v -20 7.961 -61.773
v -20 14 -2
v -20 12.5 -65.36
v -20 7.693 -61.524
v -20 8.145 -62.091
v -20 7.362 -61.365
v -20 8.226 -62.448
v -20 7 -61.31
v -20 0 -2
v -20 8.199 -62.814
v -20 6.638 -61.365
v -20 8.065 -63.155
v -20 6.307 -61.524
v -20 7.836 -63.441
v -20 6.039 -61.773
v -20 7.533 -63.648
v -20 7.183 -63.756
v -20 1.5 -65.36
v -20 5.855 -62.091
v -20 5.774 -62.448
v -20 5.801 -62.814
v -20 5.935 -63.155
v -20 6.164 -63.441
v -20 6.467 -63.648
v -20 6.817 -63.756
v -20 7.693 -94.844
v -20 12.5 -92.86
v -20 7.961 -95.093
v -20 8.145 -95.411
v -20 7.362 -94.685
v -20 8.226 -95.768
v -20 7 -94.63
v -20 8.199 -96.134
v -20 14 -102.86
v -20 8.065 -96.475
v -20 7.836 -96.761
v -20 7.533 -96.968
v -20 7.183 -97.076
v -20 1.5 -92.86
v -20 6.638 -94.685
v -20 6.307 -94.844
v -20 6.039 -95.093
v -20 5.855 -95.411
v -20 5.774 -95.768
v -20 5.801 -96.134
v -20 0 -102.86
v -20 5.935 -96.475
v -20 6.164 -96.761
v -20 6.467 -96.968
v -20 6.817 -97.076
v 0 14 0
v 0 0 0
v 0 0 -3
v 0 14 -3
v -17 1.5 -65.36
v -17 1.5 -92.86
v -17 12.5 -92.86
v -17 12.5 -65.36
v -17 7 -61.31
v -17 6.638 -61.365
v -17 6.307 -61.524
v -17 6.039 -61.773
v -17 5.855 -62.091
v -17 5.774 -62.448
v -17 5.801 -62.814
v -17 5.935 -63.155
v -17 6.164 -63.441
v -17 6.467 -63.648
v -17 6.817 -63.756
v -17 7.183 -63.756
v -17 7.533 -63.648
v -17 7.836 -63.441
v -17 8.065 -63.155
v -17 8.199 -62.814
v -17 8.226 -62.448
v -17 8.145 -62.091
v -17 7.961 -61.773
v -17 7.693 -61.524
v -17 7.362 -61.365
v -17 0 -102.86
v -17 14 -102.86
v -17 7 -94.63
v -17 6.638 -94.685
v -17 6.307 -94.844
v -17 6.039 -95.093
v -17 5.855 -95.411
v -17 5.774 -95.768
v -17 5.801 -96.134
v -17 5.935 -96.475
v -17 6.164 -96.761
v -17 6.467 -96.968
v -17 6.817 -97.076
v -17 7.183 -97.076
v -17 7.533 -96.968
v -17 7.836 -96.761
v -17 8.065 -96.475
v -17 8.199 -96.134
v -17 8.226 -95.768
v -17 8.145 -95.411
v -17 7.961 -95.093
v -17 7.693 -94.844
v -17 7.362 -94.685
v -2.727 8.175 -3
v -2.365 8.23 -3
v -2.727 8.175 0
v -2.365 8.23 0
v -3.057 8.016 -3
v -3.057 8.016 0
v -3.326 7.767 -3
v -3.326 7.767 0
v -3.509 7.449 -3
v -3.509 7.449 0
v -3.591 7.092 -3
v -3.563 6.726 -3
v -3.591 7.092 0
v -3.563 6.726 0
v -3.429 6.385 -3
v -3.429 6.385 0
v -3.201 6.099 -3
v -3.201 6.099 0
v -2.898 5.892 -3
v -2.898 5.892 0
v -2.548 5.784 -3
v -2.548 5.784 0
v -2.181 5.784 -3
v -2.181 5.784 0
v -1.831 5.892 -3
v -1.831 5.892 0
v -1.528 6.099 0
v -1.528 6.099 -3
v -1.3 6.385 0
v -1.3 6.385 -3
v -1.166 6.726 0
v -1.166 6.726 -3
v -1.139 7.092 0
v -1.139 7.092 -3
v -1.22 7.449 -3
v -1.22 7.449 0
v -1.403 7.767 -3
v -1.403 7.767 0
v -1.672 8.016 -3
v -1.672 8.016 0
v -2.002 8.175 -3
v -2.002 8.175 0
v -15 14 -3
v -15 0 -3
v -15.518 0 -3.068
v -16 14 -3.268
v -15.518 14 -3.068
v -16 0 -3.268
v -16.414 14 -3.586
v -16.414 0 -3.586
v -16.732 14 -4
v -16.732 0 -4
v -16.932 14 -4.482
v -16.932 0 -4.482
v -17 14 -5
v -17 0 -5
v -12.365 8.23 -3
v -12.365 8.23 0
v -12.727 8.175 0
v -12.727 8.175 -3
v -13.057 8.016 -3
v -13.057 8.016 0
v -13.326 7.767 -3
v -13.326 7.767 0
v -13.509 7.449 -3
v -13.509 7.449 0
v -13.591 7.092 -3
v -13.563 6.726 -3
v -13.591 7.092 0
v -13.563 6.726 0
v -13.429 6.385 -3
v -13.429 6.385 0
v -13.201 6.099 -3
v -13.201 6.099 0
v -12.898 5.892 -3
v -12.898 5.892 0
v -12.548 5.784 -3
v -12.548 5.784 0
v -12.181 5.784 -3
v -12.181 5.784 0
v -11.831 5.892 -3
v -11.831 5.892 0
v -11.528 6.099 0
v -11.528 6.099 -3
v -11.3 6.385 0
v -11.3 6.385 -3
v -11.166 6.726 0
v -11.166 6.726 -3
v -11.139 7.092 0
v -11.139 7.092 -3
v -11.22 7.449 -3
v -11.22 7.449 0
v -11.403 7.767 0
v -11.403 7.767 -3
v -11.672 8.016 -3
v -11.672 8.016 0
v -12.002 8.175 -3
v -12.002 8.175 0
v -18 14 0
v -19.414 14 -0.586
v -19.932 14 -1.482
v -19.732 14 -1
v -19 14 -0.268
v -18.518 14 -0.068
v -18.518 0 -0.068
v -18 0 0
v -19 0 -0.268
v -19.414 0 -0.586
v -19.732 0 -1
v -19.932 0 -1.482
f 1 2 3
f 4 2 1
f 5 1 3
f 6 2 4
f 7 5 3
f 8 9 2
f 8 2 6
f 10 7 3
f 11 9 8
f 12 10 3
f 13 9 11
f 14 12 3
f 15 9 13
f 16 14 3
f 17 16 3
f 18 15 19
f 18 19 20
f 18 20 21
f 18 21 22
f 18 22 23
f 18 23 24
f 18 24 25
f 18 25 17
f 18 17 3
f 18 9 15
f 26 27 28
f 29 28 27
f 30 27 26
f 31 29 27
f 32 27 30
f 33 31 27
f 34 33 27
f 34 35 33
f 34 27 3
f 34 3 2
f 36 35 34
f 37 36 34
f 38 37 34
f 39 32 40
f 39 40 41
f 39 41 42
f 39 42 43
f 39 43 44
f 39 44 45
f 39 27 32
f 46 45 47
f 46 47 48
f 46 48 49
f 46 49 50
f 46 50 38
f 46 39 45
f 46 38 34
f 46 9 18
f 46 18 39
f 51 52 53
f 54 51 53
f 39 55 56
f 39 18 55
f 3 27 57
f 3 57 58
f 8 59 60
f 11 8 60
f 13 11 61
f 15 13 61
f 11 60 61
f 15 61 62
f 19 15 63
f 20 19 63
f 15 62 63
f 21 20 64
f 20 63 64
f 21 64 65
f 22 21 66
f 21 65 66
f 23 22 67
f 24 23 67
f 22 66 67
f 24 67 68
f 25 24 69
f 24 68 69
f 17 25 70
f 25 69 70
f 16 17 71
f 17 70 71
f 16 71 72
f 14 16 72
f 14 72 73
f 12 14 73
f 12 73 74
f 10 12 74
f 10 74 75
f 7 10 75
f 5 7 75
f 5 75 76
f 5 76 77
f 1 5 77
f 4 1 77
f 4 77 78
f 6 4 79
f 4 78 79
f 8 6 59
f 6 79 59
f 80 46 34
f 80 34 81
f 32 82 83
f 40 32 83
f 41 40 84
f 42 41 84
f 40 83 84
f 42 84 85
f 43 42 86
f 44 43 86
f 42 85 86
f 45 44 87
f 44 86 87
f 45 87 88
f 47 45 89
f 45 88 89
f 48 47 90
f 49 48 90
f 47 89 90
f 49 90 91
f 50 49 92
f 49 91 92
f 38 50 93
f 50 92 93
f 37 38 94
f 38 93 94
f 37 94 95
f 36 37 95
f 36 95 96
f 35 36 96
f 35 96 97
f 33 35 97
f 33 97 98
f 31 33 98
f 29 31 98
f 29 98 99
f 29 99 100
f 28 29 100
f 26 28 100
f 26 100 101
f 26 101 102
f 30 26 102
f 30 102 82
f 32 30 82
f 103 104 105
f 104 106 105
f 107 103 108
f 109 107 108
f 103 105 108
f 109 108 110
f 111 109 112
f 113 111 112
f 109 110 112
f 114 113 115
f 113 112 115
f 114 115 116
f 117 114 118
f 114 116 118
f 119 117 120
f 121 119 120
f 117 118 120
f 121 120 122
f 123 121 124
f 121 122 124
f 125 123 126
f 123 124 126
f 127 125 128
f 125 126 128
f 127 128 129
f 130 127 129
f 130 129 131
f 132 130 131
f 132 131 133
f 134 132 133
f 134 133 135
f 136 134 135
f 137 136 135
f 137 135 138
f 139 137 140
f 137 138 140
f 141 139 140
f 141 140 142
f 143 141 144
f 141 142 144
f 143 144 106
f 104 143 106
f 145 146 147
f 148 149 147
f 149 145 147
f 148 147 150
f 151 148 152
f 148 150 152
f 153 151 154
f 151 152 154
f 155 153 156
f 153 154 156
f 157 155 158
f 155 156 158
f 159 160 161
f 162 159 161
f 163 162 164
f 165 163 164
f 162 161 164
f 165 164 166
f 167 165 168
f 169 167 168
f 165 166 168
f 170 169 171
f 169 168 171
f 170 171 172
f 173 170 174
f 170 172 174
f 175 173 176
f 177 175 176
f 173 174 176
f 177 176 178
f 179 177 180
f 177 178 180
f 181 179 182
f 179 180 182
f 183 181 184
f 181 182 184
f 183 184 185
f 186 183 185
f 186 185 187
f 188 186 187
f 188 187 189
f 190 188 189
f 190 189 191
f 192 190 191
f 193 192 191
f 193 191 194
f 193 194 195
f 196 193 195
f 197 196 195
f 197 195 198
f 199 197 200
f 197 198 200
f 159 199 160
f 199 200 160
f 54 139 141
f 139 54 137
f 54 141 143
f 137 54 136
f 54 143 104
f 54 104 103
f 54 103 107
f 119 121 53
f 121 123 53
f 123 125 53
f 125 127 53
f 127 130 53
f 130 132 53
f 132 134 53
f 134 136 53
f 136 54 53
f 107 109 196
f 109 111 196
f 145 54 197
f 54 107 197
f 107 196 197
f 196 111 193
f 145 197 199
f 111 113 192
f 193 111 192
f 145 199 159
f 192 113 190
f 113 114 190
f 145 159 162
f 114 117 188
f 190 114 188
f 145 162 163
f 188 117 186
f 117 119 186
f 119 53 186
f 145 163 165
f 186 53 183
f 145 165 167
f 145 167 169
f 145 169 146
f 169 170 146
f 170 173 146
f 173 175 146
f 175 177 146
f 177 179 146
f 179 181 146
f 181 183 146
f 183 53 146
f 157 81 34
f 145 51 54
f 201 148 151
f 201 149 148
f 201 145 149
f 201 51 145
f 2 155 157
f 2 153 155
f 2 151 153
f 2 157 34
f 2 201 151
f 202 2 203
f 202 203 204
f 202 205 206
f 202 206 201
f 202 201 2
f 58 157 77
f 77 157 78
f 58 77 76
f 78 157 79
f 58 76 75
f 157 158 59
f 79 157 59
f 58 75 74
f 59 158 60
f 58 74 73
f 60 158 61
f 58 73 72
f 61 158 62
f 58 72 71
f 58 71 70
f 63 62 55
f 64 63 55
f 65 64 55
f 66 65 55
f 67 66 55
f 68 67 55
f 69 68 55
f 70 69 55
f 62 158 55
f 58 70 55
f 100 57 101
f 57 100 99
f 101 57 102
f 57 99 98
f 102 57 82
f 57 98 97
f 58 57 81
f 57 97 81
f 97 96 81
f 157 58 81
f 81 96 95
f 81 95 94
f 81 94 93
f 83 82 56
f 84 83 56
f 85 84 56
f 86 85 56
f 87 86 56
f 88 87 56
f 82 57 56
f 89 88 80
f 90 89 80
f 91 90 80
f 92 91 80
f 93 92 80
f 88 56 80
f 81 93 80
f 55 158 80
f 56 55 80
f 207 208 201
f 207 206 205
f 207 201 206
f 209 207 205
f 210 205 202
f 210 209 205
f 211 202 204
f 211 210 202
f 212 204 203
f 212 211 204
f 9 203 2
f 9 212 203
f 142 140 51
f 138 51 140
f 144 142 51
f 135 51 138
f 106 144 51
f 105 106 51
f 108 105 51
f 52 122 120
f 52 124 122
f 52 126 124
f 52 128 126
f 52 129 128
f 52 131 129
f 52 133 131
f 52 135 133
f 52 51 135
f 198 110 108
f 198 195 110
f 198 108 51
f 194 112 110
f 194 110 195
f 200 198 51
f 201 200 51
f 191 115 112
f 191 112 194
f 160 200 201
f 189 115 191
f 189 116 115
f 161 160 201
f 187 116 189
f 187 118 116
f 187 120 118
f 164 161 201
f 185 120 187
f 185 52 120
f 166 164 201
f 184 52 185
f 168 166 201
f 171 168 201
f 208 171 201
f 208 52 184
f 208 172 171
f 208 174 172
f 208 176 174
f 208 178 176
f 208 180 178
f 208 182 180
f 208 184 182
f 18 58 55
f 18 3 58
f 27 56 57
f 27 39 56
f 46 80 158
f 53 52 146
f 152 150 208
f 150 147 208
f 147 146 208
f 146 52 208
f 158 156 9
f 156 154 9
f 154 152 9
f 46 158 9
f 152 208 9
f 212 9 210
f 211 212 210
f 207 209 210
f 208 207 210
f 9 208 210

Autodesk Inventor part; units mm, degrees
ref_plane "YZ Plane" through (0, 0, 0) normal (1, 0, 0) x (0, 1, 0)
ref_plane "XZ Plane" through (0, 0, 0) normal (0, 1, 0) x (-1, 0, 0)
ref_plane "XY Plane" through (0, 0, 0) normal (0, 0, 1) x (1, 0, 0)
sketch "Sketch1" plane through (0, 0, 0) normal (0, 1, 0) x (-1, 0, 0)
  line L0 (0, 0) -> (0, -3)
  line L1 (0, -3) -> (15, -3)
  line L2 (17, -5) -> (17, -102.86)
  line L3 (0, 0) -> (18, 0)
  line L4 (20, -2) -> (20, -102.86)
  line L5 (20, -102.86) -> (17, -102.86)
  arc A0 (17, -5) -> (15, -3) centre (15, -5) ccw
  arc A1 (20, -2) -> (18, 0) centre (18, -2) ccw
  point P0 (17, -3)
  point P1 (20, 0)
  dimension "d0" = 3
  dimension "d1" = 17
  dimension "d2" = 99.86
  dimension "d3" = 20
  dimension "d4" = 2
extrude "Extrusion1" add sketch "Sketch1" along normal blind 14
sketch "Sketch2" plane through (0, 0, -3) normal (0, 0, -1) x (-1, 0, 0)
  point P0 (0, 0)
sketch "Sketch3" plane through (0, 0, -3) normal (0, 0, -1) x (-1, 0, 0)
  circle A0 centre (2.3646, 7) radius 1.5
  circle A1 centre (12.3646, 7) radius 1.5
  line L0 (0, 14) -> (15, 14) projected
  line L1 (0, 0) -> (15, 0) projected
  dimension "d7" = 3
  dimension "d8" = 3
  dimension "d9" = 14
  dimension "d10" = 7
  dimension "d11" = 10
hole "Hole1" at (-2.3646, 7, -3) at (-12.3646, 7, -3) direction (0, 0, 1) diameter 2.459 depth 8.8 tip angle 118 thread size "M3x0.5" class "6H" standard "ISO Metric profile"
sketch "Sketch4" plane through (-20, 0, -102.86) normal (-1, 0, 0) x (0, 0, 1)
  line L0 (10, 12.5) -> (37.5, 12.5)
  line L1 (37.5, 12.5) -> (37.5, 1.5)
  line L2 (37.5, 1.5) -> (10, 1.5)
  line L3 (10, 1.5) -> (10, 12.5)
  line L4 (0, 14) -> (100.86, 14) projected
  line L5 (0, 0) -> (100.86, 0) projected
  line L6 (0, 0) -> (0, 14) projected
  circle A0 centre (7, 7) radius 1.5
  circle A1 centre (40.32, 7) radius 1.5
  point P0 (102.86, 0)
  dimension "d19" = 27.5
  dimension "d20" = 11
  dimension "d21" = 14
  dimension "d22" = 1.5
  dimension "d23" = 10
  dimension "d24" = 3
  dimension "d25" = 3
  dimension "d26" = 33.32
  dimension "d29" = 7
hole "Hole2" at (-20, 7, -62.54) at (-20, 7, -95.86) direction (1, 0, 0) diameter 2.459 depth 8.8 tip angle 118 thread size "M3x0.5" class "6H" standard "ISO Metric profile"
extrude "Extrusion2" cut sketch "Sketch4" against normal blind 14 contours L0 L1 L2 L3
equation "\"d10\" = 0.5 * d9"
equation "\"d22\" = -0.5 * d20 + 0.5 * d21"
properties part number "płytka złącza"
